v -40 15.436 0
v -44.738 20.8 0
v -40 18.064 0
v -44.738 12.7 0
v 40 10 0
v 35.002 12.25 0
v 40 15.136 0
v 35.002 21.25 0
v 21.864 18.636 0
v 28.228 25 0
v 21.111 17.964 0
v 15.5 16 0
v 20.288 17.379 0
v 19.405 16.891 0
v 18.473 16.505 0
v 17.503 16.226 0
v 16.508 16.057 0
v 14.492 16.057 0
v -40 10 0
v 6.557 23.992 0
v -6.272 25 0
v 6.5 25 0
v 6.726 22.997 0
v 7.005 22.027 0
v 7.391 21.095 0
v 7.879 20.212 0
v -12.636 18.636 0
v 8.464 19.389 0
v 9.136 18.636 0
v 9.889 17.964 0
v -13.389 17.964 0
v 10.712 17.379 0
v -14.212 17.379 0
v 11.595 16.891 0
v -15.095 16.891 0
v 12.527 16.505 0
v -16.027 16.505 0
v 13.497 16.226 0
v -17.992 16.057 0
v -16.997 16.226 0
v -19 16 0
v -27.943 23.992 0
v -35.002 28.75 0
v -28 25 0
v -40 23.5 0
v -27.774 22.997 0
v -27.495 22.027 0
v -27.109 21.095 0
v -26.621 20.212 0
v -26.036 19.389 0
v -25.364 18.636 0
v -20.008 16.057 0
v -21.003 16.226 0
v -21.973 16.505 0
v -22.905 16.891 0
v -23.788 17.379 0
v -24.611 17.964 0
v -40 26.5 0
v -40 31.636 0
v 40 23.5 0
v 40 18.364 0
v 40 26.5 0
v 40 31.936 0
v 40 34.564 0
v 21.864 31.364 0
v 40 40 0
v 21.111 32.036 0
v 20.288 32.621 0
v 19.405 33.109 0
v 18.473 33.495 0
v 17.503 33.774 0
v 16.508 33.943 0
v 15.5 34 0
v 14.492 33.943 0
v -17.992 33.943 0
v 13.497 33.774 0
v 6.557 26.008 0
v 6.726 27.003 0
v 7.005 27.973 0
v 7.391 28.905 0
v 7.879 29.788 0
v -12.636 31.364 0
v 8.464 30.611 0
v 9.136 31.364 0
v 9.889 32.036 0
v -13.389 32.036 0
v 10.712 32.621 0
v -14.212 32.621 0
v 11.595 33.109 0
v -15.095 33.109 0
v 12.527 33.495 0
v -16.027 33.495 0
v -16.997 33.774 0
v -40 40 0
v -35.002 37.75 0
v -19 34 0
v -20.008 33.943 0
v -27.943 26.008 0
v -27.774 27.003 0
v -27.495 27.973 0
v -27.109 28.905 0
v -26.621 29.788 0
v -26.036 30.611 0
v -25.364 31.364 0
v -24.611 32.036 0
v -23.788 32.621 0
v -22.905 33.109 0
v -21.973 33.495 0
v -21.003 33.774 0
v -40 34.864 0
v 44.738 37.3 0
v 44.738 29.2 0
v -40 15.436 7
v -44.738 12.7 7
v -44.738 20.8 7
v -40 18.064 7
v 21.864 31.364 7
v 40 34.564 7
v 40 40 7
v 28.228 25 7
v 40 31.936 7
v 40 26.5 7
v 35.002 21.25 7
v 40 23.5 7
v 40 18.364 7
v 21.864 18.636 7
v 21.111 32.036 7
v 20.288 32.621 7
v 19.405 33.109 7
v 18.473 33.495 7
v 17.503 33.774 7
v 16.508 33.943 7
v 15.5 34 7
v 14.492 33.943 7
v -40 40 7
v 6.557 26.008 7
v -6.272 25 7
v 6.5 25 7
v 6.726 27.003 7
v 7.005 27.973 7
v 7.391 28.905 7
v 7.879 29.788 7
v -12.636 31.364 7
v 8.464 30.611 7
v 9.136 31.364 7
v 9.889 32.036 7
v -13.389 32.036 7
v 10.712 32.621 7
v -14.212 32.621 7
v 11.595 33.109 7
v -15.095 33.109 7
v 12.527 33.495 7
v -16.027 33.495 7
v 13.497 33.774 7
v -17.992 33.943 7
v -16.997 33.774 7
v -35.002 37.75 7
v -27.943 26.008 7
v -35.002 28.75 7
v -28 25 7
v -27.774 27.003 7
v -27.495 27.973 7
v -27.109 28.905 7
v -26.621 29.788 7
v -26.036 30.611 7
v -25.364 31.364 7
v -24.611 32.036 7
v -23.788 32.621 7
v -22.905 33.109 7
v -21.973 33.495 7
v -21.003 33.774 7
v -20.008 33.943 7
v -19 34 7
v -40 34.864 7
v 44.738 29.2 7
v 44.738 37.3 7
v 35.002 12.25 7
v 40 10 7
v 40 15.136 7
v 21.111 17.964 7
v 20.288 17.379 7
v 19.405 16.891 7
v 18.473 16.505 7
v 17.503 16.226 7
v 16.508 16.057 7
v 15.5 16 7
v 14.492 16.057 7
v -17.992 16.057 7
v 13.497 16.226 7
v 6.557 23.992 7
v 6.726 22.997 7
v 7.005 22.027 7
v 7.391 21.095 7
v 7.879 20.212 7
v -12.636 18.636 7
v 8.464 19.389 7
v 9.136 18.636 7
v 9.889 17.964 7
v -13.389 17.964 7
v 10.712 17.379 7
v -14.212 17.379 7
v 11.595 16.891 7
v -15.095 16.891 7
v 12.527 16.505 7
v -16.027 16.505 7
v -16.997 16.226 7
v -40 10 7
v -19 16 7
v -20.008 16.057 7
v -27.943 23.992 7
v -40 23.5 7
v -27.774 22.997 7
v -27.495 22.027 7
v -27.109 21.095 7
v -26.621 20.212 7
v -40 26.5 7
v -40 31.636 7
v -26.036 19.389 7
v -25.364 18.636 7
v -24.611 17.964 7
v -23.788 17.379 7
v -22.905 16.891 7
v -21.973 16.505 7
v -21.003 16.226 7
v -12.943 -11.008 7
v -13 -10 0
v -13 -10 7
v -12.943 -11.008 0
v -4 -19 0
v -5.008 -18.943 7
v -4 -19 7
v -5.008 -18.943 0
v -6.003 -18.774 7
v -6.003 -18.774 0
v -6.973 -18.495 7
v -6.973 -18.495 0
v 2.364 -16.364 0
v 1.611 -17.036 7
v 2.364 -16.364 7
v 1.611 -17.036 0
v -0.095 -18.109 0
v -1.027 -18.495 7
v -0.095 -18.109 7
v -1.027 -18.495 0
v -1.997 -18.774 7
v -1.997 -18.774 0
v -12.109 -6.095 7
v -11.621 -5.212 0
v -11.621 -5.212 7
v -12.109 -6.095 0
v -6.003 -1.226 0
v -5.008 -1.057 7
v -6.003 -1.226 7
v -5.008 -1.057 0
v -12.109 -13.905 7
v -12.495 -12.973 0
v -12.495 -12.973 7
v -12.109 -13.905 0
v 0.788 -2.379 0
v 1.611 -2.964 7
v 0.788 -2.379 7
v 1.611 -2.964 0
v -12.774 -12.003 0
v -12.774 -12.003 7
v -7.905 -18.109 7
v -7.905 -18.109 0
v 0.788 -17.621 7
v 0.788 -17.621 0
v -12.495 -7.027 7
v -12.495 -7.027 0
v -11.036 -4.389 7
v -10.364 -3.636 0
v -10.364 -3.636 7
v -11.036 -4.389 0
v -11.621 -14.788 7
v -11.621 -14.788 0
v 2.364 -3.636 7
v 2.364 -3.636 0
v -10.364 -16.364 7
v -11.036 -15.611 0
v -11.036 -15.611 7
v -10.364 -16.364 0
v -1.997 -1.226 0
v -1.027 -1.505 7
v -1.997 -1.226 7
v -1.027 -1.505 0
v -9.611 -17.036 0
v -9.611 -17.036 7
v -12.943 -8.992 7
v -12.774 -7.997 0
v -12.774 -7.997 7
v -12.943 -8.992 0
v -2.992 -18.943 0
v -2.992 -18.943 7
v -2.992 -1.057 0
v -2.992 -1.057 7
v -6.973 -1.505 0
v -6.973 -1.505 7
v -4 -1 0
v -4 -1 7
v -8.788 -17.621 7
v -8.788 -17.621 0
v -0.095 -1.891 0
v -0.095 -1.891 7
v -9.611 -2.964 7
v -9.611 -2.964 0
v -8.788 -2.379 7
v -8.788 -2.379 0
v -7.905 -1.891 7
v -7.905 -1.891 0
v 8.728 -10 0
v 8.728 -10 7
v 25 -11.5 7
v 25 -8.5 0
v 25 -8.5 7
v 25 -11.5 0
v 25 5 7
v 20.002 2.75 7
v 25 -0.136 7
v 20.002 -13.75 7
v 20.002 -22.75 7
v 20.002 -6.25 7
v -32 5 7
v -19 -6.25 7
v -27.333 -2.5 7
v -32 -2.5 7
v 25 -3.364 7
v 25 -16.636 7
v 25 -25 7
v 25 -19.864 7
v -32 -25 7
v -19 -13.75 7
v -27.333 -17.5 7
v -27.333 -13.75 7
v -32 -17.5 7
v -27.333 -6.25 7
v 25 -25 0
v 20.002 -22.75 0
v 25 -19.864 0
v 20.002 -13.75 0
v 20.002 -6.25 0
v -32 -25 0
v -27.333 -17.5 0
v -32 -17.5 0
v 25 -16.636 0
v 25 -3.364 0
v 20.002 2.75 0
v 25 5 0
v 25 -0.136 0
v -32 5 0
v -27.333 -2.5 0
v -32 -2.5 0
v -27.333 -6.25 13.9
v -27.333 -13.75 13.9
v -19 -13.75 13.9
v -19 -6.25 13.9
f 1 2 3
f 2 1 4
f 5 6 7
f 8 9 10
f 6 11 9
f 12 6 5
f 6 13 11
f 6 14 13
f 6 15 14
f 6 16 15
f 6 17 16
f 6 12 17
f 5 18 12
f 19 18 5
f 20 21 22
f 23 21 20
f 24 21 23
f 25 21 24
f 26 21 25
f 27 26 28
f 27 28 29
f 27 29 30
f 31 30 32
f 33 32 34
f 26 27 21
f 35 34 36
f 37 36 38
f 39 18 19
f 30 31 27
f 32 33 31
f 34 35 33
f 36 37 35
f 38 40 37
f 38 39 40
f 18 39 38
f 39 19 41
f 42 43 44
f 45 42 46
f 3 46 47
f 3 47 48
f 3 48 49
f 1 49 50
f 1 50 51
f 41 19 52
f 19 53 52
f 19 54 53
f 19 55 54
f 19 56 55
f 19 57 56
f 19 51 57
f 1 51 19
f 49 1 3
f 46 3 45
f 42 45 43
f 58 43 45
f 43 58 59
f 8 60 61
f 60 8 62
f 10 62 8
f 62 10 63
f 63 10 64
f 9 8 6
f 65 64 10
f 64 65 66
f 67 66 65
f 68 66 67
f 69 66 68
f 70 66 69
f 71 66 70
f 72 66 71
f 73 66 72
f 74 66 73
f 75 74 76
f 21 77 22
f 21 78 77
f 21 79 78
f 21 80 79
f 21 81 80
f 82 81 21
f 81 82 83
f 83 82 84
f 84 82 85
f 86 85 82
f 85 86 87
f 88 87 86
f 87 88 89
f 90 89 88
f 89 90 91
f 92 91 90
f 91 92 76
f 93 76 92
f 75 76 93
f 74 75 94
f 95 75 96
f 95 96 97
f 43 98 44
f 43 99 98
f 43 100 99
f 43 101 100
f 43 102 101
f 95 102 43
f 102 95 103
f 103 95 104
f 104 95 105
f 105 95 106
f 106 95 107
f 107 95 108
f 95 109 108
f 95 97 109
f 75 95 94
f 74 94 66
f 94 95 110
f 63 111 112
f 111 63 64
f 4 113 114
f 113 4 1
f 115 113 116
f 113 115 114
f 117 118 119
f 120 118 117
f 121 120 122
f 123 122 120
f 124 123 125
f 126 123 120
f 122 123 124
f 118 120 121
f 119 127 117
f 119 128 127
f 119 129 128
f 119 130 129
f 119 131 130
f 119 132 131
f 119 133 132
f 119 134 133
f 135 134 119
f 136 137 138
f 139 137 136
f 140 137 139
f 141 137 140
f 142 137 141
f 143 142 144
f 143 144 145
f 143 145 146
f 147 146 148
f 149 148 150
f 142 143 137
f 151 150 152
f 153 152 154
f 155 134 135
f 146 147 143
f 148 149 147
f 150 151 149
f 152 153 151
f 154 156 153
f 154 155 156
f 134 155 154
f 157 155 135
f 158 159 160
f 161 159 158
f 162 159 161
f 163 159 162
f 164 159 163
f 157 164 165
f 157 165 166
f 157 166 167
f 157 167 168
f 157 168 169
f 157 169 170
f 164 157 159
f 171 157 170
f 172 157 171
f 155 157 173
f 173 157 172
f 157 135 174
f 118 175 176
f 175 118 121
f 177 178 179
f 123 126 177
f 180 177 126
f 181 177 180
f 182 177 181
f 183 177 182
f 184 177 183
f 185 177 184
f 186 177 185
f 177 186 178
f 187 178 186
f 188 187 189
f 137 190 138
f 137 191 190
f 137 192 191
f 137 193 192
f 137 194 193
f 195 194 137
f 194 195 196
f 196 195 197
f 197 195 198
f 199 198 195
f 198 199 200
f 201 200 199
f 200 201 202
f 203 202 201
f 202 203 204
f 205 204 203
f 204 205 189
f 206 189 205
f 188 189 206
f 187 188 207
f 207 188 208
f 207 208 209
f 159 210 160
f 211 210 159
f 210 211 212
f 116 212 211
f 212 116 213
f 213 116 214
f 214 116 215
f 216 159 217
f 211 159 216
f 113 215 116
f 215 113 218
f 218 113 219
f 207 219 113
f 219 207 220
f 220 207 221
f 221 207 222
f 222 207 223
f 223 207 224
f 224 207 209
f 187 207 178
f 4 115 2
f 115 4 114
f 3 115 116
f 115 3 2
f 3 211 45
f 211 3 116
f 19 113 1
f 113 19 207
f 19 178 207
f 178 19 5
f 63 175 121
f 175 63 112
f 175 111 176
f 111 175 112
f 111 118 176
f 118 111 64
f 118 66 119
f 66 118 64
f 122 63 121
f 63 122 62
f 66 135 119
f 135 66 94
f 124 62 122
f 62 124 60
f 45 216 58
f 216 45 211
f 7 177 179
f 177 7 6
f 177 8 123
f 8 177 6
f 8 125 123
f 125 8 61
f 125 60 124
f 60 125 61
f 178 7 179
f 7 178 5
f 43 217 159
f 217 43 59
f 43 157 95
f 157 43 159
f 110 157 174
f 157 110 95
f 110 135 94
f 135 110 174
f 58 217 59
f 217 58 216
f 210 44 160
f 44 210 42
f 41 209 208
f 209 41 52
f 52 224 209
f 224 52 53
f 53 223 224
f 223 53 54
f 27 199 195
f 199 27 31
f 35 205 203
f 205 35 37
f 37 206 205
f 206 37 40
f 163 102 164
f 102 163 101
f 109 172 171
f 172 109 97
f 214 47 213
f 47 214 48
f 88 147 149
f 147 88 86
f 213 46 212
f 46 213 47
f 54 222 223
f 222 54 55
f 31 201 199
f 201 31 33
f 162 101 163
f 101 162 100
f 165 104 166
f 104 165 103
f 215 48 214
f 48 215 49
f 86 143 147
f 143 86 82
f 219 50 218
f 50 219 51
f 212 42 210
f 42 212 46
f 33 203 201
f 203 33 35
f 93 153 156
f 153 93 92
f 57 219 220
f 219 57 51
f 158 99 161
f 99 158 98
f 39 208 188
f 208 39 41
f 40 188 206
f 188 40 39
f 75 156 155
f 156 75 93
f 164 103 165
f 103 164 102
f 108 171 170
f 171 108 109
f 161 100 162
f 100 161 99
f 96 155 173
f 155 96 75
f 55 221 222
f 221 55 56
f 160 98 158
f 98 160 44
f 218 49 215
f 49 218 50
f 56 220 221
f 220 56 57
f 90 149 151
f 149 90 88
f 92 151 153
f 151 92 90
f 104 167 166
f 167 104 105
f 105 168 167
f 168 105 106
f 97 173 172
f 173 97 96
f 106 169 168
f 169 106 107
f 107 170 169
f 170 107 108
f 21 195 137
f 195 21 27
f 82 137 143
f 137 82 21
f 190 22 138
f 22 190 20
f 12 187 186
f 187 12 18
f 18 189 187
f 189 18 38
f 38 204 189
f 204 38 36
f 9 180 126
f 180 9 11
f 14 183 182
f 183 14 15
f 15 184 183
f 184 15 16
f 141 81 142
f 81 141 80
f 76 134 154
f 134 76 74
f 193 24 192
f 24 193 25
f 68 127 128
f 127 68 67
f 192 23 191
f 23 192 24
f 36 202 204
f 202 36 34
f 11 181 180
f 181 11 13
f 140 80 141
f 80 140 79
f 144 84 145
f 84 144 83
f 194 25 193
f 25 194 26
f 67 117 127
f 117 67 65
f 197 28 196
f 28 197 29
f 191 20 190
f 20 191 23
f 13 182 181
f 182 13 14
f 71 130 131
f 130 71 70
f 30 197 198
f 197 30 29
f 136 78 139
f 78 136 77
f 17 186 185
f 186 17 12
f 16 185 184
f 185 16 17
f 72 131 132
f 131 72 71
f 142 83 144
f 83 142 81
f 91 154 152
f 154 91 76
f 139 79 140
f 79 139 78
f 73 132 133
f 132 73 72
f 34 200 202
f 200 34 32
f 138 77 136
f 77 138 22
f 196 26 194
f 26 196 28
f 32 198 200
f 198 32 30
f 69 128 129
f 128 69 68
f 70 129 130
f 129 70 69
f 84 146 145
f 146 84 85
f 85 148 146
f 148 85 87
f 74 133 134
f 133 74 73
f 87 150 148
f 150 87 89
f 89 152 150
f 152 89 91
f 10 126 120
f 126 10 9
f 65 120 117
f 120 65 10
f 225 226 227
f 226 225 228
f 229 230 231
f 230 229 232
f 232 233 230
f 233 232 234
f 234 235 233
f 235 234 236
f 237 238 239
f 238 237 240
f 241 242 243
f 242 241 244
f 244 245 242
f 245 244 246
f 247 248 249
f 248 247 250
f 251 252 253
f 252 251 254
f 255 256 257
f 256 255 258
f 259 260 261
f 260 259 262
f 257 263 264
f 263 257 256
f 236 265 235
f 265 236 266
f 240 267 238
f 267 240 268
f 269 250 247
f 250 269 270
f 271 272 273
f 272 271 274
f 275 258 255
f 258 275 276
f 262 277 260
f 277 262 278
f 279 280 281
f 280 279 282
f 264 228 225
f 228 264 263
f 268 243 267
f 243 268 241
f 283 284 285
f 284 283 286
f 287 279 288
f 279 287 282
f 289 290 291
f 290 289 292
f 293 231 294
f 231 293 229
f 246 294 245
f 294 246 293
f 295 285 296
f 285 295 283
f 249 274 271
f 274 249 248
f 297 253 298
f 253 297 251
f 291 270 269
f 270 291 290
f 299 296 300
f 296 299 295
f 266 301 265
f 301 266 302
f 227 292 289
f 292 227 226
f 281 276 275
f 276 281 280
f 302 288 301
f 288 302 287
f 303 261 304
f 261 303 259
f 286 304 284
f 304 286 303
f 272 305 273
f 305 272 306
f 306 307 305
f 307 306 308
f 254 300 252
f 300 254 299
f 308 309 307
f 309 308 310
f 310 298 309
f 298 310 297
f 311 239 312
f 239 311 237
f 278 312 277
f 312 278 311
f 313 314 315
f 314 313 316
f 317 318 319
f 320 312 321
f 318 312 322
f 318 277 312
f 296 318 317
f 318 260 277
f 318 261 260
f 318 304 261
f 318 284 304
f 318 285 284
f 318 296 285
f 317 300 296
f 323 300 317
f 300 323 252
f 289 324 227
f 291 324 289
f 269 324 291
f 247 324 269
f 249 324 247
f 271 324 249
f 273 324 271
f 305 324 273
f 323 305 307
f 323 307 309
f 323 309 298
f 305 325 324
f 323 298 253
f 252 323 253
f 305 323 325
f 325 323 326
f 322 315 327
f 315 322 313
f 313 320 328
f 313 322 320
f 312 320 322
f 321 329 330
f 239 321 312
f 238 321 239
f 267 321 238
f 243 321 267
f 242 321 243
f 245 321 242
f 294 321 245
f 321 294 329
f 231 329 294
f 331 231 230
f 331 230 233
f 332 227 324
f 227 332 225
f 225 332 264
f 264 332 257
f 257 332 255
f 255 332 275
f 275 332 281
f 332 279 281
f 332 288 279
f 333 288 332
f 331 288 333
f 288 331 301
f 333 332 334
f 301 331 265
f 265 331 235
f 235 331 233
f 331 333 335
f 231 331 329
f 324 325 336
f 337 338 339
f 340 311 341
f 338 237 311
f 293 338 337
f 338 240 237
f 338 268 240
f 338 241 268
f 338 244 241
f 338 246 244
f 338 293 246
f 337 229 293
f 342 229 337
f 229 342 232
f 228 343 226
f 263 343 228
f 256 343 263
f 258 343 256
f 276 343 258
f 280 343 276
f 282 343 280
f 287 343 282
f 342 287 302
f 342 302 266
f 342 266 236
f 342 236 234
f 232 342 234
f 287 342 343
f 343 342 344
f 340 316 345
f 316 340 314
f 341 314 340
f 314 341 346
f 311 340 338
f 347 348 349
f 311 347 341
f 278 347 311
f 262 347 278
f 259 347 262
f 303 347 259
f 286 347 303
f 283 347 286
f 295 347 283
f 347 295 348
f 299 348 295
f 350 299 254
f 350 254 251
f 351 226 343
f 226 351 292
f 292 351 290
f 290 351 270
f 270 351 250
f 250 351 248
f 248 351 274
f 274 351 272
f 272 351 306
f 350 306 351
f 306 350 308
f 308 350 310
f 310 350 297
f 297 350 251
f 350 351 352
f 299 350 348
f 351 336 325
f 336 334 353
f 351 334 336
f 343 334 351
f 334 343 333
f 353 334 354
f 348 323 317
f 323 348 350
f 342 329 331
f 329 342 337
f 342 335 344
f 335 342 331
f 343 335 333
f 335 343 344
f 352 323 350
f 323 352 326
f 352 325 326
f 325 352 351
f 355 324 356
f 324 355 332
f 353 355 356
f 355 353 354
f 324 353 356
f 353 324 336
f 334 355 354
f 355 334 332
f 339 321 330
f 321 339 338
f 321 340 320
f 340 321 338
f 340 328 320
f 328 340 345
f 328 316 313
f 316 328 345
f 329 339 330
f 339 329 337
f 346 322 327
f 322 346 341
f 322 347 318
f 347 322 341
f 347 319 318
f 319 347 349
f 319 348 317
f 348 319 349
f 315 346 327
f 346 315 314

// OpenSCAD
// file: strut_dummies.scad
use <Libs.scad>
include <ss_parms.scad>

peg_width = bs_width / 4;

bs_dummy();

module es_dummy(){
	union(){
		cube([es_length, es_width, es_height + 0.05]);
		translate([es_length, es_width - 6.75, es_height/2])
			dovetail(male = false, height = es_height + 0.05);
	}
}

module bs_dummy(tol = bv_tolerance){
	union(){
		// body
		translate([-bs_sink, 0, 0]) 
			cube(size=[bs_length + bs_sink, bs_width+tol, bs_height+tol]);
		// mounting pegs
		translate([-bv_width-0.1, 0, 0]) 
			cube(size=[bv_width - bs_sink +0.5, peg_width+tol, bs_height+tol]);
		translate([-bv_width-0.1, bs_width - peg_width , 0]) 
			cube(size=[bv_width - bs_sink + 0.5, peg_width+tol, bs_height+tol]);
		// support cube
		translate([-bs_sink, (bs_width-peg_width)  / 2, bs_height- 0.1])
			cube(size=[bs_sink + 0.5 * bs_td_space, peg_width+tol, bs_height+tol]);
	}
}
// file: mcad/triangles.scad
/**
 * Simple triangles library
 *
 * Authors:
 *   - Eero 'rambo' af Heurlin 2010-
 *
 * License: LGPL 2.1
 */


/**
 * Standard right-angled triangle
 *
 * @param number o_len Lenght of the opposite side
 * @param number a_len Lenght of the adjacent side
 * @param number depth How wide/deep the triangle is in the 3rd dimension
 * @todo a better way ?
 */
module triangle(o_len, a_len, depth)
{
    linear_extrude(height=depth)
    {
        polygon(points=[[0,0],[a_len,0],[0,o_len]], paths=[[0,1,2]]);
    }
}

/**
 * Standard right-angled triangle (tangent version)
 *
 * @param number angle of adjacent to hypotenuse (ie tangent)
 * @param number a_len Lenght of the adjacent side
 * @param number depth How wide/deep the triangle is in the 3rd dimension
 */
module a_triangle(tan_angle, a_len, depth)
{
    linear_extrude(height=depth)
    {
        polygon(points=[[0,0],[a_len,0],[0,tan(tan_angle) * a_len]], paths=[[0,1,2]]);
    }
}

// Tests:
module test_triangle() { triangle(5, 5, 5); }
module test_a_triangle() { a_triangle(45, 5, 5); }
module test_triangles()
{
    // Generate a bunch of triangles by sizes
    for (i = [1:10])
    {
        translate([i*7, -30, i*7])
        {
            triangle(i*5, sqrt(i*5+pow(i,2)), 5);
        }
    }

    // Generate a bunch of triangles by angle
    for (i = [1:85/5])
    {
        translate([i*7, 22, i*7])
        {
            a_triangle(i*5, 10, 5);
        }
    }
}
// file: mcad/units.scad
/*
 * Basic units.
 *
 * Originally by Hans Häggström, 2010.
 * Dual licenced under Creative Commons Attribution-Share Alike 3.0 and LGPL2 or later
 */


mm = 1;
cm = 10 * mm;
dm = 100 * mm;
m = 1000 * mm;

inch = 25.4 * mm;

X = [1, 0, 0];
Y = [0, 1, 0];
Z = [0, 0, 1];

M3 = 3*mm;
M4 = 4*mm;
M5 = 5*mm;
M6 = 6*mm;
M8 = 8*mm;


// When a small distance is needed to overlap shapes for boolean cutting, etc.
epsilon = 0.01*mm;

phi=0.5*(sqrt(5) + 1 );
// file: y_rod_strut.scad
include <Libs.scad> 
include <ss_parms.scad>
use <strut_dummies.scad>

libEcho=false;

foot_length = bv_radius - ys_width/2;

y_rod_strut(tol = ys_rod_tol); 

module y_rod_strut(tol = ys_rod_tol){
	difference(){
		union(){
			// main body
			cube(size=[ys_length, ys_width, ys_height]);
			// dovetails
			translate([0, 6.75, ys_height/2]) 
				mirror([1,0,0]) 
					dovetail(male = true, height = ys_height);
			translate([0,  ys_width - 6.75, ys_height/2]) 
				mirror([1,0,0]) 
					dovetail(male = true, height = ys_height);
			translate([ys_length, 6.75, ys_height/2]) 
				dovetail(male = true, height = ys_height);
			translate([ys_length,  ys_width - 6.75, ys_height/2])
				dovetail(male = true, height = ys_height);
			// rod mount
			translate([ys_length / 2, ys_width / 2, ys_height + ys_rod_length / 2])
				rod_mount(tol);
			// optional foot
			if (ys_foot){
				translate([ys_length/2, -1 * foot_length,0]) slot([ys_foot_width, 0.1 + foot_length, ys_height],true,false);     
			}
		}
		// rod countersinks 
		translate([ys_length / 2, ys_width / 2, ys_height + ys_rod_length/2 - ys_rod_sink])
				cylinder(r=tol + ys_rod_diameter / 2, h=ys_rod_length + 0.1, center=true, $fn=resolution(ys_rod_diameter));
	}
}
// file: base_strut.scad
include <Libs.scad>
include <ss_parms.scad>
use <mcad/triangles.scad>

libEcho=false;

peg_width = bs_width / 4;

module base_strut(){
	difference(){
		union(){
			// body
			translate([-bs_sink, 0, 0]) 
				cube(size=[bs_length + bs_sink, bs_width, bs_height]);
			// mounting pegs
			translate([-1 * bv_width, 0, 0]) 
				cube(size=[bv_width - bs_sink +0.1, peg_width, bs_height]);
			translate([-1 * bv_width, bs_width - peg_width , 0]) 
				cube(size=[bv_width - bs_sink + 0.1, peg_width, bs_height]);
			// support cube
			translate([-bs_sink, (bs_width-peg_width)  / 2, bs_height- 0.1])
				cube(size=[bs_sink + 0.5 * bs_td_space, peg_width, bs_height]);

		}
		// female dovetails
		translate([bs_length, 6.75, bs_height/2]) mirror([1,0,0]) 
			dovetail(male = false, height = 1.1* bs_height);
		translate([bs_length,  bs_width - 6.75, bs_height/2]) mirror([1,0,0]) 
			dovetail(male = false, height = 1.1* bs_height);
		// teardrop hole
		if (bs_teardrops) {
			for ( i = [0 : bs_num_td - 1 ]) {
				translate([bs_td_space + bs_td_radius +  i * (2.5 * bs_td_radius + bs_td_space),  bs_width / 2, bs_height/2])
				 rotate(righty(90))
					 teardrop(radius=bs_td_radius,  length = 1.1* bs_height, angle=90);	
			}
		}
	}
}

base_strut();
// file: end_strut.scad
include <Libs.scad>
include <ss_parms.scad>

libEcho=false;

//end_strut();

module end_strut(){
	difference(){
		union(){
			cube(size=[es_length, es_width, es_height]);
			translate([0, 6.75, es_height/2]) mirror([1,0,0]) dovetail(height = es_height);
			translate([es_length,  es_width- 6.75, es_height/2]) dovetail(height = es_height);
		}
		translate([es_length, 6.75, es_height/2]) mirror([1,0,0]) dovetail(male = false, height = 1.1* es_height);
		translate([0,  es_width- 6.75, es_height/2]) dovetail(male = false, height = 1.1* es_height);
		if (es_teardrops) {
			for ( i = [0 : es_num_td - 1 ]) {
				translate([es_td_space + es_td_radius +  i * (2.5 * es_td_radius + es_td_space),  es_width / 2, es_height/2])
				 rotate(righty(90))
					 teardrop(radius=es_td_radius,  length = 1.1* es_height, angle=90);	
			}
		}
	}
}
// file: ss_parms.scad
/*
 * Parameters for SugarSnap RepRap 
 *  Copyright (C) 2011  Adam Milner
 *
 *  This program is free software; you can redistribute it and/or modify
 *  it under the terms of the GNU General Public License as published by
 *  the Free Software Foundation; either version 2 of the License, or
 *  (at your option) any later version.
 *
 *  This program is distributed in the hope that it will be useful,
 *  but WITHOUT ANY WARRANTY; without even the implied warranty of
 *  MERCHANTABILITY or FITNESS FOR A PARTICULAR PURPOSE.  See the
 *  GNU General Public License for more details.
 *
 *  You should have received a copy of the GNU General Public License
 *  along with this program; if not, write to the Free Software
 *  Foundation, Inc., 59 Temple Place, Suite 330, Boston, MA  02111-1307  USA
 *
*/

include <mcad/units.scad>

/*** End Struts ***/
es_length = 80; // strut body length
es_width = 30;	// strut body width
es_height = 7; // strut body thickness
es_teardrops = true; // include teardrop holes
es_td_radius = 9; // teardrop hole radius
es_num_td = 2;	// number of teardrops
es_td_space = 12; // space between teardrops 

/*** Base Struts ***/
bs_length = 50; // strut body length
bs_width = 30;	// strut body width
bs_height = 7; // strut body thickness
bs_teardrops = true; // include teardrop holes
bs_td_radius = 9; // teardrop hole radius
bs_num_td = 1;	// number of teardrops
bs_td_space = 12; // space between teardrops 

/*** Y Rod Support Struts ***/
ys_length = 30; // strut body length
ys_width = bs_width;	// strut body width
ys_height = bs_height; // strut body thickness
ys_foot = true;	// use a foot on the y rod support
ys_foot_width = 8;	// foot width
ys_rod_diameter = (3/8) * inch + 0.05; // outer diameter of the y-rod, plus some shrinkage
ys_rod_wall = 3;
ys_rod_length = 15;

/*** Y Motor Strut Struts ***/
ym_length = 100; // strut body length
ym_width = bs_width;	// strut body width
ym_height = bs_height ; // strut body thickness

/*** Bottom Vertex ***/
bv_width = es_height; // vertex thickness
bv_radius = 31; // radius of the vertex
bs_sink = es_height/3; // how far to countersink the y supporting base struts into the vertex
bs_outset = 10; // outset of the y supporting base struts from the center of the vertex
bv_tolerance = 0.45; // shrinkage tolerence for the strut slots

/*** Top Vertex ***/
tv_rod_diameter = ys_rod_diameter; // outer diameter of the x-rod, plus some shrinkage
tv_rod_wall = ys_rod_wall;
tv_rod_length = ys_rod_length;
tv_rod_spacing = 35; // space between the inside edges of the x-rods
tv_rod_lift = 0; // center of x rods above center of vertex semi-circle
tv_top_height = tv_rod_diameter/2 + tv_rod_wall + tv_rod_lift + 5; // vertex body height above bottom half circle
tv_rod_sink = 5;

/*** X Motor Mount ***/
x_dt_space = 20; // spacing between the X motor mount dovetails
// main file
use <Libs.scad>
include <ss_parms.scad>
use <end_strut.scad>
use <base_strut.scad>
use <y_rod_strut.scad> 
libEcho = false;

preview = false;

module ShowPegGrid(Size) {
 
 for (x=[-5:5])
  for (y=[-5:5])
   translate([x*10,y*10,Size/2])
    cube(Size,center=true);
 
}

if (preview) 
	ShowPegGrid(1.0);

translate([-40,10,0])
	end_strut();
	

translate([-25,-25,0])
		base_strut();
